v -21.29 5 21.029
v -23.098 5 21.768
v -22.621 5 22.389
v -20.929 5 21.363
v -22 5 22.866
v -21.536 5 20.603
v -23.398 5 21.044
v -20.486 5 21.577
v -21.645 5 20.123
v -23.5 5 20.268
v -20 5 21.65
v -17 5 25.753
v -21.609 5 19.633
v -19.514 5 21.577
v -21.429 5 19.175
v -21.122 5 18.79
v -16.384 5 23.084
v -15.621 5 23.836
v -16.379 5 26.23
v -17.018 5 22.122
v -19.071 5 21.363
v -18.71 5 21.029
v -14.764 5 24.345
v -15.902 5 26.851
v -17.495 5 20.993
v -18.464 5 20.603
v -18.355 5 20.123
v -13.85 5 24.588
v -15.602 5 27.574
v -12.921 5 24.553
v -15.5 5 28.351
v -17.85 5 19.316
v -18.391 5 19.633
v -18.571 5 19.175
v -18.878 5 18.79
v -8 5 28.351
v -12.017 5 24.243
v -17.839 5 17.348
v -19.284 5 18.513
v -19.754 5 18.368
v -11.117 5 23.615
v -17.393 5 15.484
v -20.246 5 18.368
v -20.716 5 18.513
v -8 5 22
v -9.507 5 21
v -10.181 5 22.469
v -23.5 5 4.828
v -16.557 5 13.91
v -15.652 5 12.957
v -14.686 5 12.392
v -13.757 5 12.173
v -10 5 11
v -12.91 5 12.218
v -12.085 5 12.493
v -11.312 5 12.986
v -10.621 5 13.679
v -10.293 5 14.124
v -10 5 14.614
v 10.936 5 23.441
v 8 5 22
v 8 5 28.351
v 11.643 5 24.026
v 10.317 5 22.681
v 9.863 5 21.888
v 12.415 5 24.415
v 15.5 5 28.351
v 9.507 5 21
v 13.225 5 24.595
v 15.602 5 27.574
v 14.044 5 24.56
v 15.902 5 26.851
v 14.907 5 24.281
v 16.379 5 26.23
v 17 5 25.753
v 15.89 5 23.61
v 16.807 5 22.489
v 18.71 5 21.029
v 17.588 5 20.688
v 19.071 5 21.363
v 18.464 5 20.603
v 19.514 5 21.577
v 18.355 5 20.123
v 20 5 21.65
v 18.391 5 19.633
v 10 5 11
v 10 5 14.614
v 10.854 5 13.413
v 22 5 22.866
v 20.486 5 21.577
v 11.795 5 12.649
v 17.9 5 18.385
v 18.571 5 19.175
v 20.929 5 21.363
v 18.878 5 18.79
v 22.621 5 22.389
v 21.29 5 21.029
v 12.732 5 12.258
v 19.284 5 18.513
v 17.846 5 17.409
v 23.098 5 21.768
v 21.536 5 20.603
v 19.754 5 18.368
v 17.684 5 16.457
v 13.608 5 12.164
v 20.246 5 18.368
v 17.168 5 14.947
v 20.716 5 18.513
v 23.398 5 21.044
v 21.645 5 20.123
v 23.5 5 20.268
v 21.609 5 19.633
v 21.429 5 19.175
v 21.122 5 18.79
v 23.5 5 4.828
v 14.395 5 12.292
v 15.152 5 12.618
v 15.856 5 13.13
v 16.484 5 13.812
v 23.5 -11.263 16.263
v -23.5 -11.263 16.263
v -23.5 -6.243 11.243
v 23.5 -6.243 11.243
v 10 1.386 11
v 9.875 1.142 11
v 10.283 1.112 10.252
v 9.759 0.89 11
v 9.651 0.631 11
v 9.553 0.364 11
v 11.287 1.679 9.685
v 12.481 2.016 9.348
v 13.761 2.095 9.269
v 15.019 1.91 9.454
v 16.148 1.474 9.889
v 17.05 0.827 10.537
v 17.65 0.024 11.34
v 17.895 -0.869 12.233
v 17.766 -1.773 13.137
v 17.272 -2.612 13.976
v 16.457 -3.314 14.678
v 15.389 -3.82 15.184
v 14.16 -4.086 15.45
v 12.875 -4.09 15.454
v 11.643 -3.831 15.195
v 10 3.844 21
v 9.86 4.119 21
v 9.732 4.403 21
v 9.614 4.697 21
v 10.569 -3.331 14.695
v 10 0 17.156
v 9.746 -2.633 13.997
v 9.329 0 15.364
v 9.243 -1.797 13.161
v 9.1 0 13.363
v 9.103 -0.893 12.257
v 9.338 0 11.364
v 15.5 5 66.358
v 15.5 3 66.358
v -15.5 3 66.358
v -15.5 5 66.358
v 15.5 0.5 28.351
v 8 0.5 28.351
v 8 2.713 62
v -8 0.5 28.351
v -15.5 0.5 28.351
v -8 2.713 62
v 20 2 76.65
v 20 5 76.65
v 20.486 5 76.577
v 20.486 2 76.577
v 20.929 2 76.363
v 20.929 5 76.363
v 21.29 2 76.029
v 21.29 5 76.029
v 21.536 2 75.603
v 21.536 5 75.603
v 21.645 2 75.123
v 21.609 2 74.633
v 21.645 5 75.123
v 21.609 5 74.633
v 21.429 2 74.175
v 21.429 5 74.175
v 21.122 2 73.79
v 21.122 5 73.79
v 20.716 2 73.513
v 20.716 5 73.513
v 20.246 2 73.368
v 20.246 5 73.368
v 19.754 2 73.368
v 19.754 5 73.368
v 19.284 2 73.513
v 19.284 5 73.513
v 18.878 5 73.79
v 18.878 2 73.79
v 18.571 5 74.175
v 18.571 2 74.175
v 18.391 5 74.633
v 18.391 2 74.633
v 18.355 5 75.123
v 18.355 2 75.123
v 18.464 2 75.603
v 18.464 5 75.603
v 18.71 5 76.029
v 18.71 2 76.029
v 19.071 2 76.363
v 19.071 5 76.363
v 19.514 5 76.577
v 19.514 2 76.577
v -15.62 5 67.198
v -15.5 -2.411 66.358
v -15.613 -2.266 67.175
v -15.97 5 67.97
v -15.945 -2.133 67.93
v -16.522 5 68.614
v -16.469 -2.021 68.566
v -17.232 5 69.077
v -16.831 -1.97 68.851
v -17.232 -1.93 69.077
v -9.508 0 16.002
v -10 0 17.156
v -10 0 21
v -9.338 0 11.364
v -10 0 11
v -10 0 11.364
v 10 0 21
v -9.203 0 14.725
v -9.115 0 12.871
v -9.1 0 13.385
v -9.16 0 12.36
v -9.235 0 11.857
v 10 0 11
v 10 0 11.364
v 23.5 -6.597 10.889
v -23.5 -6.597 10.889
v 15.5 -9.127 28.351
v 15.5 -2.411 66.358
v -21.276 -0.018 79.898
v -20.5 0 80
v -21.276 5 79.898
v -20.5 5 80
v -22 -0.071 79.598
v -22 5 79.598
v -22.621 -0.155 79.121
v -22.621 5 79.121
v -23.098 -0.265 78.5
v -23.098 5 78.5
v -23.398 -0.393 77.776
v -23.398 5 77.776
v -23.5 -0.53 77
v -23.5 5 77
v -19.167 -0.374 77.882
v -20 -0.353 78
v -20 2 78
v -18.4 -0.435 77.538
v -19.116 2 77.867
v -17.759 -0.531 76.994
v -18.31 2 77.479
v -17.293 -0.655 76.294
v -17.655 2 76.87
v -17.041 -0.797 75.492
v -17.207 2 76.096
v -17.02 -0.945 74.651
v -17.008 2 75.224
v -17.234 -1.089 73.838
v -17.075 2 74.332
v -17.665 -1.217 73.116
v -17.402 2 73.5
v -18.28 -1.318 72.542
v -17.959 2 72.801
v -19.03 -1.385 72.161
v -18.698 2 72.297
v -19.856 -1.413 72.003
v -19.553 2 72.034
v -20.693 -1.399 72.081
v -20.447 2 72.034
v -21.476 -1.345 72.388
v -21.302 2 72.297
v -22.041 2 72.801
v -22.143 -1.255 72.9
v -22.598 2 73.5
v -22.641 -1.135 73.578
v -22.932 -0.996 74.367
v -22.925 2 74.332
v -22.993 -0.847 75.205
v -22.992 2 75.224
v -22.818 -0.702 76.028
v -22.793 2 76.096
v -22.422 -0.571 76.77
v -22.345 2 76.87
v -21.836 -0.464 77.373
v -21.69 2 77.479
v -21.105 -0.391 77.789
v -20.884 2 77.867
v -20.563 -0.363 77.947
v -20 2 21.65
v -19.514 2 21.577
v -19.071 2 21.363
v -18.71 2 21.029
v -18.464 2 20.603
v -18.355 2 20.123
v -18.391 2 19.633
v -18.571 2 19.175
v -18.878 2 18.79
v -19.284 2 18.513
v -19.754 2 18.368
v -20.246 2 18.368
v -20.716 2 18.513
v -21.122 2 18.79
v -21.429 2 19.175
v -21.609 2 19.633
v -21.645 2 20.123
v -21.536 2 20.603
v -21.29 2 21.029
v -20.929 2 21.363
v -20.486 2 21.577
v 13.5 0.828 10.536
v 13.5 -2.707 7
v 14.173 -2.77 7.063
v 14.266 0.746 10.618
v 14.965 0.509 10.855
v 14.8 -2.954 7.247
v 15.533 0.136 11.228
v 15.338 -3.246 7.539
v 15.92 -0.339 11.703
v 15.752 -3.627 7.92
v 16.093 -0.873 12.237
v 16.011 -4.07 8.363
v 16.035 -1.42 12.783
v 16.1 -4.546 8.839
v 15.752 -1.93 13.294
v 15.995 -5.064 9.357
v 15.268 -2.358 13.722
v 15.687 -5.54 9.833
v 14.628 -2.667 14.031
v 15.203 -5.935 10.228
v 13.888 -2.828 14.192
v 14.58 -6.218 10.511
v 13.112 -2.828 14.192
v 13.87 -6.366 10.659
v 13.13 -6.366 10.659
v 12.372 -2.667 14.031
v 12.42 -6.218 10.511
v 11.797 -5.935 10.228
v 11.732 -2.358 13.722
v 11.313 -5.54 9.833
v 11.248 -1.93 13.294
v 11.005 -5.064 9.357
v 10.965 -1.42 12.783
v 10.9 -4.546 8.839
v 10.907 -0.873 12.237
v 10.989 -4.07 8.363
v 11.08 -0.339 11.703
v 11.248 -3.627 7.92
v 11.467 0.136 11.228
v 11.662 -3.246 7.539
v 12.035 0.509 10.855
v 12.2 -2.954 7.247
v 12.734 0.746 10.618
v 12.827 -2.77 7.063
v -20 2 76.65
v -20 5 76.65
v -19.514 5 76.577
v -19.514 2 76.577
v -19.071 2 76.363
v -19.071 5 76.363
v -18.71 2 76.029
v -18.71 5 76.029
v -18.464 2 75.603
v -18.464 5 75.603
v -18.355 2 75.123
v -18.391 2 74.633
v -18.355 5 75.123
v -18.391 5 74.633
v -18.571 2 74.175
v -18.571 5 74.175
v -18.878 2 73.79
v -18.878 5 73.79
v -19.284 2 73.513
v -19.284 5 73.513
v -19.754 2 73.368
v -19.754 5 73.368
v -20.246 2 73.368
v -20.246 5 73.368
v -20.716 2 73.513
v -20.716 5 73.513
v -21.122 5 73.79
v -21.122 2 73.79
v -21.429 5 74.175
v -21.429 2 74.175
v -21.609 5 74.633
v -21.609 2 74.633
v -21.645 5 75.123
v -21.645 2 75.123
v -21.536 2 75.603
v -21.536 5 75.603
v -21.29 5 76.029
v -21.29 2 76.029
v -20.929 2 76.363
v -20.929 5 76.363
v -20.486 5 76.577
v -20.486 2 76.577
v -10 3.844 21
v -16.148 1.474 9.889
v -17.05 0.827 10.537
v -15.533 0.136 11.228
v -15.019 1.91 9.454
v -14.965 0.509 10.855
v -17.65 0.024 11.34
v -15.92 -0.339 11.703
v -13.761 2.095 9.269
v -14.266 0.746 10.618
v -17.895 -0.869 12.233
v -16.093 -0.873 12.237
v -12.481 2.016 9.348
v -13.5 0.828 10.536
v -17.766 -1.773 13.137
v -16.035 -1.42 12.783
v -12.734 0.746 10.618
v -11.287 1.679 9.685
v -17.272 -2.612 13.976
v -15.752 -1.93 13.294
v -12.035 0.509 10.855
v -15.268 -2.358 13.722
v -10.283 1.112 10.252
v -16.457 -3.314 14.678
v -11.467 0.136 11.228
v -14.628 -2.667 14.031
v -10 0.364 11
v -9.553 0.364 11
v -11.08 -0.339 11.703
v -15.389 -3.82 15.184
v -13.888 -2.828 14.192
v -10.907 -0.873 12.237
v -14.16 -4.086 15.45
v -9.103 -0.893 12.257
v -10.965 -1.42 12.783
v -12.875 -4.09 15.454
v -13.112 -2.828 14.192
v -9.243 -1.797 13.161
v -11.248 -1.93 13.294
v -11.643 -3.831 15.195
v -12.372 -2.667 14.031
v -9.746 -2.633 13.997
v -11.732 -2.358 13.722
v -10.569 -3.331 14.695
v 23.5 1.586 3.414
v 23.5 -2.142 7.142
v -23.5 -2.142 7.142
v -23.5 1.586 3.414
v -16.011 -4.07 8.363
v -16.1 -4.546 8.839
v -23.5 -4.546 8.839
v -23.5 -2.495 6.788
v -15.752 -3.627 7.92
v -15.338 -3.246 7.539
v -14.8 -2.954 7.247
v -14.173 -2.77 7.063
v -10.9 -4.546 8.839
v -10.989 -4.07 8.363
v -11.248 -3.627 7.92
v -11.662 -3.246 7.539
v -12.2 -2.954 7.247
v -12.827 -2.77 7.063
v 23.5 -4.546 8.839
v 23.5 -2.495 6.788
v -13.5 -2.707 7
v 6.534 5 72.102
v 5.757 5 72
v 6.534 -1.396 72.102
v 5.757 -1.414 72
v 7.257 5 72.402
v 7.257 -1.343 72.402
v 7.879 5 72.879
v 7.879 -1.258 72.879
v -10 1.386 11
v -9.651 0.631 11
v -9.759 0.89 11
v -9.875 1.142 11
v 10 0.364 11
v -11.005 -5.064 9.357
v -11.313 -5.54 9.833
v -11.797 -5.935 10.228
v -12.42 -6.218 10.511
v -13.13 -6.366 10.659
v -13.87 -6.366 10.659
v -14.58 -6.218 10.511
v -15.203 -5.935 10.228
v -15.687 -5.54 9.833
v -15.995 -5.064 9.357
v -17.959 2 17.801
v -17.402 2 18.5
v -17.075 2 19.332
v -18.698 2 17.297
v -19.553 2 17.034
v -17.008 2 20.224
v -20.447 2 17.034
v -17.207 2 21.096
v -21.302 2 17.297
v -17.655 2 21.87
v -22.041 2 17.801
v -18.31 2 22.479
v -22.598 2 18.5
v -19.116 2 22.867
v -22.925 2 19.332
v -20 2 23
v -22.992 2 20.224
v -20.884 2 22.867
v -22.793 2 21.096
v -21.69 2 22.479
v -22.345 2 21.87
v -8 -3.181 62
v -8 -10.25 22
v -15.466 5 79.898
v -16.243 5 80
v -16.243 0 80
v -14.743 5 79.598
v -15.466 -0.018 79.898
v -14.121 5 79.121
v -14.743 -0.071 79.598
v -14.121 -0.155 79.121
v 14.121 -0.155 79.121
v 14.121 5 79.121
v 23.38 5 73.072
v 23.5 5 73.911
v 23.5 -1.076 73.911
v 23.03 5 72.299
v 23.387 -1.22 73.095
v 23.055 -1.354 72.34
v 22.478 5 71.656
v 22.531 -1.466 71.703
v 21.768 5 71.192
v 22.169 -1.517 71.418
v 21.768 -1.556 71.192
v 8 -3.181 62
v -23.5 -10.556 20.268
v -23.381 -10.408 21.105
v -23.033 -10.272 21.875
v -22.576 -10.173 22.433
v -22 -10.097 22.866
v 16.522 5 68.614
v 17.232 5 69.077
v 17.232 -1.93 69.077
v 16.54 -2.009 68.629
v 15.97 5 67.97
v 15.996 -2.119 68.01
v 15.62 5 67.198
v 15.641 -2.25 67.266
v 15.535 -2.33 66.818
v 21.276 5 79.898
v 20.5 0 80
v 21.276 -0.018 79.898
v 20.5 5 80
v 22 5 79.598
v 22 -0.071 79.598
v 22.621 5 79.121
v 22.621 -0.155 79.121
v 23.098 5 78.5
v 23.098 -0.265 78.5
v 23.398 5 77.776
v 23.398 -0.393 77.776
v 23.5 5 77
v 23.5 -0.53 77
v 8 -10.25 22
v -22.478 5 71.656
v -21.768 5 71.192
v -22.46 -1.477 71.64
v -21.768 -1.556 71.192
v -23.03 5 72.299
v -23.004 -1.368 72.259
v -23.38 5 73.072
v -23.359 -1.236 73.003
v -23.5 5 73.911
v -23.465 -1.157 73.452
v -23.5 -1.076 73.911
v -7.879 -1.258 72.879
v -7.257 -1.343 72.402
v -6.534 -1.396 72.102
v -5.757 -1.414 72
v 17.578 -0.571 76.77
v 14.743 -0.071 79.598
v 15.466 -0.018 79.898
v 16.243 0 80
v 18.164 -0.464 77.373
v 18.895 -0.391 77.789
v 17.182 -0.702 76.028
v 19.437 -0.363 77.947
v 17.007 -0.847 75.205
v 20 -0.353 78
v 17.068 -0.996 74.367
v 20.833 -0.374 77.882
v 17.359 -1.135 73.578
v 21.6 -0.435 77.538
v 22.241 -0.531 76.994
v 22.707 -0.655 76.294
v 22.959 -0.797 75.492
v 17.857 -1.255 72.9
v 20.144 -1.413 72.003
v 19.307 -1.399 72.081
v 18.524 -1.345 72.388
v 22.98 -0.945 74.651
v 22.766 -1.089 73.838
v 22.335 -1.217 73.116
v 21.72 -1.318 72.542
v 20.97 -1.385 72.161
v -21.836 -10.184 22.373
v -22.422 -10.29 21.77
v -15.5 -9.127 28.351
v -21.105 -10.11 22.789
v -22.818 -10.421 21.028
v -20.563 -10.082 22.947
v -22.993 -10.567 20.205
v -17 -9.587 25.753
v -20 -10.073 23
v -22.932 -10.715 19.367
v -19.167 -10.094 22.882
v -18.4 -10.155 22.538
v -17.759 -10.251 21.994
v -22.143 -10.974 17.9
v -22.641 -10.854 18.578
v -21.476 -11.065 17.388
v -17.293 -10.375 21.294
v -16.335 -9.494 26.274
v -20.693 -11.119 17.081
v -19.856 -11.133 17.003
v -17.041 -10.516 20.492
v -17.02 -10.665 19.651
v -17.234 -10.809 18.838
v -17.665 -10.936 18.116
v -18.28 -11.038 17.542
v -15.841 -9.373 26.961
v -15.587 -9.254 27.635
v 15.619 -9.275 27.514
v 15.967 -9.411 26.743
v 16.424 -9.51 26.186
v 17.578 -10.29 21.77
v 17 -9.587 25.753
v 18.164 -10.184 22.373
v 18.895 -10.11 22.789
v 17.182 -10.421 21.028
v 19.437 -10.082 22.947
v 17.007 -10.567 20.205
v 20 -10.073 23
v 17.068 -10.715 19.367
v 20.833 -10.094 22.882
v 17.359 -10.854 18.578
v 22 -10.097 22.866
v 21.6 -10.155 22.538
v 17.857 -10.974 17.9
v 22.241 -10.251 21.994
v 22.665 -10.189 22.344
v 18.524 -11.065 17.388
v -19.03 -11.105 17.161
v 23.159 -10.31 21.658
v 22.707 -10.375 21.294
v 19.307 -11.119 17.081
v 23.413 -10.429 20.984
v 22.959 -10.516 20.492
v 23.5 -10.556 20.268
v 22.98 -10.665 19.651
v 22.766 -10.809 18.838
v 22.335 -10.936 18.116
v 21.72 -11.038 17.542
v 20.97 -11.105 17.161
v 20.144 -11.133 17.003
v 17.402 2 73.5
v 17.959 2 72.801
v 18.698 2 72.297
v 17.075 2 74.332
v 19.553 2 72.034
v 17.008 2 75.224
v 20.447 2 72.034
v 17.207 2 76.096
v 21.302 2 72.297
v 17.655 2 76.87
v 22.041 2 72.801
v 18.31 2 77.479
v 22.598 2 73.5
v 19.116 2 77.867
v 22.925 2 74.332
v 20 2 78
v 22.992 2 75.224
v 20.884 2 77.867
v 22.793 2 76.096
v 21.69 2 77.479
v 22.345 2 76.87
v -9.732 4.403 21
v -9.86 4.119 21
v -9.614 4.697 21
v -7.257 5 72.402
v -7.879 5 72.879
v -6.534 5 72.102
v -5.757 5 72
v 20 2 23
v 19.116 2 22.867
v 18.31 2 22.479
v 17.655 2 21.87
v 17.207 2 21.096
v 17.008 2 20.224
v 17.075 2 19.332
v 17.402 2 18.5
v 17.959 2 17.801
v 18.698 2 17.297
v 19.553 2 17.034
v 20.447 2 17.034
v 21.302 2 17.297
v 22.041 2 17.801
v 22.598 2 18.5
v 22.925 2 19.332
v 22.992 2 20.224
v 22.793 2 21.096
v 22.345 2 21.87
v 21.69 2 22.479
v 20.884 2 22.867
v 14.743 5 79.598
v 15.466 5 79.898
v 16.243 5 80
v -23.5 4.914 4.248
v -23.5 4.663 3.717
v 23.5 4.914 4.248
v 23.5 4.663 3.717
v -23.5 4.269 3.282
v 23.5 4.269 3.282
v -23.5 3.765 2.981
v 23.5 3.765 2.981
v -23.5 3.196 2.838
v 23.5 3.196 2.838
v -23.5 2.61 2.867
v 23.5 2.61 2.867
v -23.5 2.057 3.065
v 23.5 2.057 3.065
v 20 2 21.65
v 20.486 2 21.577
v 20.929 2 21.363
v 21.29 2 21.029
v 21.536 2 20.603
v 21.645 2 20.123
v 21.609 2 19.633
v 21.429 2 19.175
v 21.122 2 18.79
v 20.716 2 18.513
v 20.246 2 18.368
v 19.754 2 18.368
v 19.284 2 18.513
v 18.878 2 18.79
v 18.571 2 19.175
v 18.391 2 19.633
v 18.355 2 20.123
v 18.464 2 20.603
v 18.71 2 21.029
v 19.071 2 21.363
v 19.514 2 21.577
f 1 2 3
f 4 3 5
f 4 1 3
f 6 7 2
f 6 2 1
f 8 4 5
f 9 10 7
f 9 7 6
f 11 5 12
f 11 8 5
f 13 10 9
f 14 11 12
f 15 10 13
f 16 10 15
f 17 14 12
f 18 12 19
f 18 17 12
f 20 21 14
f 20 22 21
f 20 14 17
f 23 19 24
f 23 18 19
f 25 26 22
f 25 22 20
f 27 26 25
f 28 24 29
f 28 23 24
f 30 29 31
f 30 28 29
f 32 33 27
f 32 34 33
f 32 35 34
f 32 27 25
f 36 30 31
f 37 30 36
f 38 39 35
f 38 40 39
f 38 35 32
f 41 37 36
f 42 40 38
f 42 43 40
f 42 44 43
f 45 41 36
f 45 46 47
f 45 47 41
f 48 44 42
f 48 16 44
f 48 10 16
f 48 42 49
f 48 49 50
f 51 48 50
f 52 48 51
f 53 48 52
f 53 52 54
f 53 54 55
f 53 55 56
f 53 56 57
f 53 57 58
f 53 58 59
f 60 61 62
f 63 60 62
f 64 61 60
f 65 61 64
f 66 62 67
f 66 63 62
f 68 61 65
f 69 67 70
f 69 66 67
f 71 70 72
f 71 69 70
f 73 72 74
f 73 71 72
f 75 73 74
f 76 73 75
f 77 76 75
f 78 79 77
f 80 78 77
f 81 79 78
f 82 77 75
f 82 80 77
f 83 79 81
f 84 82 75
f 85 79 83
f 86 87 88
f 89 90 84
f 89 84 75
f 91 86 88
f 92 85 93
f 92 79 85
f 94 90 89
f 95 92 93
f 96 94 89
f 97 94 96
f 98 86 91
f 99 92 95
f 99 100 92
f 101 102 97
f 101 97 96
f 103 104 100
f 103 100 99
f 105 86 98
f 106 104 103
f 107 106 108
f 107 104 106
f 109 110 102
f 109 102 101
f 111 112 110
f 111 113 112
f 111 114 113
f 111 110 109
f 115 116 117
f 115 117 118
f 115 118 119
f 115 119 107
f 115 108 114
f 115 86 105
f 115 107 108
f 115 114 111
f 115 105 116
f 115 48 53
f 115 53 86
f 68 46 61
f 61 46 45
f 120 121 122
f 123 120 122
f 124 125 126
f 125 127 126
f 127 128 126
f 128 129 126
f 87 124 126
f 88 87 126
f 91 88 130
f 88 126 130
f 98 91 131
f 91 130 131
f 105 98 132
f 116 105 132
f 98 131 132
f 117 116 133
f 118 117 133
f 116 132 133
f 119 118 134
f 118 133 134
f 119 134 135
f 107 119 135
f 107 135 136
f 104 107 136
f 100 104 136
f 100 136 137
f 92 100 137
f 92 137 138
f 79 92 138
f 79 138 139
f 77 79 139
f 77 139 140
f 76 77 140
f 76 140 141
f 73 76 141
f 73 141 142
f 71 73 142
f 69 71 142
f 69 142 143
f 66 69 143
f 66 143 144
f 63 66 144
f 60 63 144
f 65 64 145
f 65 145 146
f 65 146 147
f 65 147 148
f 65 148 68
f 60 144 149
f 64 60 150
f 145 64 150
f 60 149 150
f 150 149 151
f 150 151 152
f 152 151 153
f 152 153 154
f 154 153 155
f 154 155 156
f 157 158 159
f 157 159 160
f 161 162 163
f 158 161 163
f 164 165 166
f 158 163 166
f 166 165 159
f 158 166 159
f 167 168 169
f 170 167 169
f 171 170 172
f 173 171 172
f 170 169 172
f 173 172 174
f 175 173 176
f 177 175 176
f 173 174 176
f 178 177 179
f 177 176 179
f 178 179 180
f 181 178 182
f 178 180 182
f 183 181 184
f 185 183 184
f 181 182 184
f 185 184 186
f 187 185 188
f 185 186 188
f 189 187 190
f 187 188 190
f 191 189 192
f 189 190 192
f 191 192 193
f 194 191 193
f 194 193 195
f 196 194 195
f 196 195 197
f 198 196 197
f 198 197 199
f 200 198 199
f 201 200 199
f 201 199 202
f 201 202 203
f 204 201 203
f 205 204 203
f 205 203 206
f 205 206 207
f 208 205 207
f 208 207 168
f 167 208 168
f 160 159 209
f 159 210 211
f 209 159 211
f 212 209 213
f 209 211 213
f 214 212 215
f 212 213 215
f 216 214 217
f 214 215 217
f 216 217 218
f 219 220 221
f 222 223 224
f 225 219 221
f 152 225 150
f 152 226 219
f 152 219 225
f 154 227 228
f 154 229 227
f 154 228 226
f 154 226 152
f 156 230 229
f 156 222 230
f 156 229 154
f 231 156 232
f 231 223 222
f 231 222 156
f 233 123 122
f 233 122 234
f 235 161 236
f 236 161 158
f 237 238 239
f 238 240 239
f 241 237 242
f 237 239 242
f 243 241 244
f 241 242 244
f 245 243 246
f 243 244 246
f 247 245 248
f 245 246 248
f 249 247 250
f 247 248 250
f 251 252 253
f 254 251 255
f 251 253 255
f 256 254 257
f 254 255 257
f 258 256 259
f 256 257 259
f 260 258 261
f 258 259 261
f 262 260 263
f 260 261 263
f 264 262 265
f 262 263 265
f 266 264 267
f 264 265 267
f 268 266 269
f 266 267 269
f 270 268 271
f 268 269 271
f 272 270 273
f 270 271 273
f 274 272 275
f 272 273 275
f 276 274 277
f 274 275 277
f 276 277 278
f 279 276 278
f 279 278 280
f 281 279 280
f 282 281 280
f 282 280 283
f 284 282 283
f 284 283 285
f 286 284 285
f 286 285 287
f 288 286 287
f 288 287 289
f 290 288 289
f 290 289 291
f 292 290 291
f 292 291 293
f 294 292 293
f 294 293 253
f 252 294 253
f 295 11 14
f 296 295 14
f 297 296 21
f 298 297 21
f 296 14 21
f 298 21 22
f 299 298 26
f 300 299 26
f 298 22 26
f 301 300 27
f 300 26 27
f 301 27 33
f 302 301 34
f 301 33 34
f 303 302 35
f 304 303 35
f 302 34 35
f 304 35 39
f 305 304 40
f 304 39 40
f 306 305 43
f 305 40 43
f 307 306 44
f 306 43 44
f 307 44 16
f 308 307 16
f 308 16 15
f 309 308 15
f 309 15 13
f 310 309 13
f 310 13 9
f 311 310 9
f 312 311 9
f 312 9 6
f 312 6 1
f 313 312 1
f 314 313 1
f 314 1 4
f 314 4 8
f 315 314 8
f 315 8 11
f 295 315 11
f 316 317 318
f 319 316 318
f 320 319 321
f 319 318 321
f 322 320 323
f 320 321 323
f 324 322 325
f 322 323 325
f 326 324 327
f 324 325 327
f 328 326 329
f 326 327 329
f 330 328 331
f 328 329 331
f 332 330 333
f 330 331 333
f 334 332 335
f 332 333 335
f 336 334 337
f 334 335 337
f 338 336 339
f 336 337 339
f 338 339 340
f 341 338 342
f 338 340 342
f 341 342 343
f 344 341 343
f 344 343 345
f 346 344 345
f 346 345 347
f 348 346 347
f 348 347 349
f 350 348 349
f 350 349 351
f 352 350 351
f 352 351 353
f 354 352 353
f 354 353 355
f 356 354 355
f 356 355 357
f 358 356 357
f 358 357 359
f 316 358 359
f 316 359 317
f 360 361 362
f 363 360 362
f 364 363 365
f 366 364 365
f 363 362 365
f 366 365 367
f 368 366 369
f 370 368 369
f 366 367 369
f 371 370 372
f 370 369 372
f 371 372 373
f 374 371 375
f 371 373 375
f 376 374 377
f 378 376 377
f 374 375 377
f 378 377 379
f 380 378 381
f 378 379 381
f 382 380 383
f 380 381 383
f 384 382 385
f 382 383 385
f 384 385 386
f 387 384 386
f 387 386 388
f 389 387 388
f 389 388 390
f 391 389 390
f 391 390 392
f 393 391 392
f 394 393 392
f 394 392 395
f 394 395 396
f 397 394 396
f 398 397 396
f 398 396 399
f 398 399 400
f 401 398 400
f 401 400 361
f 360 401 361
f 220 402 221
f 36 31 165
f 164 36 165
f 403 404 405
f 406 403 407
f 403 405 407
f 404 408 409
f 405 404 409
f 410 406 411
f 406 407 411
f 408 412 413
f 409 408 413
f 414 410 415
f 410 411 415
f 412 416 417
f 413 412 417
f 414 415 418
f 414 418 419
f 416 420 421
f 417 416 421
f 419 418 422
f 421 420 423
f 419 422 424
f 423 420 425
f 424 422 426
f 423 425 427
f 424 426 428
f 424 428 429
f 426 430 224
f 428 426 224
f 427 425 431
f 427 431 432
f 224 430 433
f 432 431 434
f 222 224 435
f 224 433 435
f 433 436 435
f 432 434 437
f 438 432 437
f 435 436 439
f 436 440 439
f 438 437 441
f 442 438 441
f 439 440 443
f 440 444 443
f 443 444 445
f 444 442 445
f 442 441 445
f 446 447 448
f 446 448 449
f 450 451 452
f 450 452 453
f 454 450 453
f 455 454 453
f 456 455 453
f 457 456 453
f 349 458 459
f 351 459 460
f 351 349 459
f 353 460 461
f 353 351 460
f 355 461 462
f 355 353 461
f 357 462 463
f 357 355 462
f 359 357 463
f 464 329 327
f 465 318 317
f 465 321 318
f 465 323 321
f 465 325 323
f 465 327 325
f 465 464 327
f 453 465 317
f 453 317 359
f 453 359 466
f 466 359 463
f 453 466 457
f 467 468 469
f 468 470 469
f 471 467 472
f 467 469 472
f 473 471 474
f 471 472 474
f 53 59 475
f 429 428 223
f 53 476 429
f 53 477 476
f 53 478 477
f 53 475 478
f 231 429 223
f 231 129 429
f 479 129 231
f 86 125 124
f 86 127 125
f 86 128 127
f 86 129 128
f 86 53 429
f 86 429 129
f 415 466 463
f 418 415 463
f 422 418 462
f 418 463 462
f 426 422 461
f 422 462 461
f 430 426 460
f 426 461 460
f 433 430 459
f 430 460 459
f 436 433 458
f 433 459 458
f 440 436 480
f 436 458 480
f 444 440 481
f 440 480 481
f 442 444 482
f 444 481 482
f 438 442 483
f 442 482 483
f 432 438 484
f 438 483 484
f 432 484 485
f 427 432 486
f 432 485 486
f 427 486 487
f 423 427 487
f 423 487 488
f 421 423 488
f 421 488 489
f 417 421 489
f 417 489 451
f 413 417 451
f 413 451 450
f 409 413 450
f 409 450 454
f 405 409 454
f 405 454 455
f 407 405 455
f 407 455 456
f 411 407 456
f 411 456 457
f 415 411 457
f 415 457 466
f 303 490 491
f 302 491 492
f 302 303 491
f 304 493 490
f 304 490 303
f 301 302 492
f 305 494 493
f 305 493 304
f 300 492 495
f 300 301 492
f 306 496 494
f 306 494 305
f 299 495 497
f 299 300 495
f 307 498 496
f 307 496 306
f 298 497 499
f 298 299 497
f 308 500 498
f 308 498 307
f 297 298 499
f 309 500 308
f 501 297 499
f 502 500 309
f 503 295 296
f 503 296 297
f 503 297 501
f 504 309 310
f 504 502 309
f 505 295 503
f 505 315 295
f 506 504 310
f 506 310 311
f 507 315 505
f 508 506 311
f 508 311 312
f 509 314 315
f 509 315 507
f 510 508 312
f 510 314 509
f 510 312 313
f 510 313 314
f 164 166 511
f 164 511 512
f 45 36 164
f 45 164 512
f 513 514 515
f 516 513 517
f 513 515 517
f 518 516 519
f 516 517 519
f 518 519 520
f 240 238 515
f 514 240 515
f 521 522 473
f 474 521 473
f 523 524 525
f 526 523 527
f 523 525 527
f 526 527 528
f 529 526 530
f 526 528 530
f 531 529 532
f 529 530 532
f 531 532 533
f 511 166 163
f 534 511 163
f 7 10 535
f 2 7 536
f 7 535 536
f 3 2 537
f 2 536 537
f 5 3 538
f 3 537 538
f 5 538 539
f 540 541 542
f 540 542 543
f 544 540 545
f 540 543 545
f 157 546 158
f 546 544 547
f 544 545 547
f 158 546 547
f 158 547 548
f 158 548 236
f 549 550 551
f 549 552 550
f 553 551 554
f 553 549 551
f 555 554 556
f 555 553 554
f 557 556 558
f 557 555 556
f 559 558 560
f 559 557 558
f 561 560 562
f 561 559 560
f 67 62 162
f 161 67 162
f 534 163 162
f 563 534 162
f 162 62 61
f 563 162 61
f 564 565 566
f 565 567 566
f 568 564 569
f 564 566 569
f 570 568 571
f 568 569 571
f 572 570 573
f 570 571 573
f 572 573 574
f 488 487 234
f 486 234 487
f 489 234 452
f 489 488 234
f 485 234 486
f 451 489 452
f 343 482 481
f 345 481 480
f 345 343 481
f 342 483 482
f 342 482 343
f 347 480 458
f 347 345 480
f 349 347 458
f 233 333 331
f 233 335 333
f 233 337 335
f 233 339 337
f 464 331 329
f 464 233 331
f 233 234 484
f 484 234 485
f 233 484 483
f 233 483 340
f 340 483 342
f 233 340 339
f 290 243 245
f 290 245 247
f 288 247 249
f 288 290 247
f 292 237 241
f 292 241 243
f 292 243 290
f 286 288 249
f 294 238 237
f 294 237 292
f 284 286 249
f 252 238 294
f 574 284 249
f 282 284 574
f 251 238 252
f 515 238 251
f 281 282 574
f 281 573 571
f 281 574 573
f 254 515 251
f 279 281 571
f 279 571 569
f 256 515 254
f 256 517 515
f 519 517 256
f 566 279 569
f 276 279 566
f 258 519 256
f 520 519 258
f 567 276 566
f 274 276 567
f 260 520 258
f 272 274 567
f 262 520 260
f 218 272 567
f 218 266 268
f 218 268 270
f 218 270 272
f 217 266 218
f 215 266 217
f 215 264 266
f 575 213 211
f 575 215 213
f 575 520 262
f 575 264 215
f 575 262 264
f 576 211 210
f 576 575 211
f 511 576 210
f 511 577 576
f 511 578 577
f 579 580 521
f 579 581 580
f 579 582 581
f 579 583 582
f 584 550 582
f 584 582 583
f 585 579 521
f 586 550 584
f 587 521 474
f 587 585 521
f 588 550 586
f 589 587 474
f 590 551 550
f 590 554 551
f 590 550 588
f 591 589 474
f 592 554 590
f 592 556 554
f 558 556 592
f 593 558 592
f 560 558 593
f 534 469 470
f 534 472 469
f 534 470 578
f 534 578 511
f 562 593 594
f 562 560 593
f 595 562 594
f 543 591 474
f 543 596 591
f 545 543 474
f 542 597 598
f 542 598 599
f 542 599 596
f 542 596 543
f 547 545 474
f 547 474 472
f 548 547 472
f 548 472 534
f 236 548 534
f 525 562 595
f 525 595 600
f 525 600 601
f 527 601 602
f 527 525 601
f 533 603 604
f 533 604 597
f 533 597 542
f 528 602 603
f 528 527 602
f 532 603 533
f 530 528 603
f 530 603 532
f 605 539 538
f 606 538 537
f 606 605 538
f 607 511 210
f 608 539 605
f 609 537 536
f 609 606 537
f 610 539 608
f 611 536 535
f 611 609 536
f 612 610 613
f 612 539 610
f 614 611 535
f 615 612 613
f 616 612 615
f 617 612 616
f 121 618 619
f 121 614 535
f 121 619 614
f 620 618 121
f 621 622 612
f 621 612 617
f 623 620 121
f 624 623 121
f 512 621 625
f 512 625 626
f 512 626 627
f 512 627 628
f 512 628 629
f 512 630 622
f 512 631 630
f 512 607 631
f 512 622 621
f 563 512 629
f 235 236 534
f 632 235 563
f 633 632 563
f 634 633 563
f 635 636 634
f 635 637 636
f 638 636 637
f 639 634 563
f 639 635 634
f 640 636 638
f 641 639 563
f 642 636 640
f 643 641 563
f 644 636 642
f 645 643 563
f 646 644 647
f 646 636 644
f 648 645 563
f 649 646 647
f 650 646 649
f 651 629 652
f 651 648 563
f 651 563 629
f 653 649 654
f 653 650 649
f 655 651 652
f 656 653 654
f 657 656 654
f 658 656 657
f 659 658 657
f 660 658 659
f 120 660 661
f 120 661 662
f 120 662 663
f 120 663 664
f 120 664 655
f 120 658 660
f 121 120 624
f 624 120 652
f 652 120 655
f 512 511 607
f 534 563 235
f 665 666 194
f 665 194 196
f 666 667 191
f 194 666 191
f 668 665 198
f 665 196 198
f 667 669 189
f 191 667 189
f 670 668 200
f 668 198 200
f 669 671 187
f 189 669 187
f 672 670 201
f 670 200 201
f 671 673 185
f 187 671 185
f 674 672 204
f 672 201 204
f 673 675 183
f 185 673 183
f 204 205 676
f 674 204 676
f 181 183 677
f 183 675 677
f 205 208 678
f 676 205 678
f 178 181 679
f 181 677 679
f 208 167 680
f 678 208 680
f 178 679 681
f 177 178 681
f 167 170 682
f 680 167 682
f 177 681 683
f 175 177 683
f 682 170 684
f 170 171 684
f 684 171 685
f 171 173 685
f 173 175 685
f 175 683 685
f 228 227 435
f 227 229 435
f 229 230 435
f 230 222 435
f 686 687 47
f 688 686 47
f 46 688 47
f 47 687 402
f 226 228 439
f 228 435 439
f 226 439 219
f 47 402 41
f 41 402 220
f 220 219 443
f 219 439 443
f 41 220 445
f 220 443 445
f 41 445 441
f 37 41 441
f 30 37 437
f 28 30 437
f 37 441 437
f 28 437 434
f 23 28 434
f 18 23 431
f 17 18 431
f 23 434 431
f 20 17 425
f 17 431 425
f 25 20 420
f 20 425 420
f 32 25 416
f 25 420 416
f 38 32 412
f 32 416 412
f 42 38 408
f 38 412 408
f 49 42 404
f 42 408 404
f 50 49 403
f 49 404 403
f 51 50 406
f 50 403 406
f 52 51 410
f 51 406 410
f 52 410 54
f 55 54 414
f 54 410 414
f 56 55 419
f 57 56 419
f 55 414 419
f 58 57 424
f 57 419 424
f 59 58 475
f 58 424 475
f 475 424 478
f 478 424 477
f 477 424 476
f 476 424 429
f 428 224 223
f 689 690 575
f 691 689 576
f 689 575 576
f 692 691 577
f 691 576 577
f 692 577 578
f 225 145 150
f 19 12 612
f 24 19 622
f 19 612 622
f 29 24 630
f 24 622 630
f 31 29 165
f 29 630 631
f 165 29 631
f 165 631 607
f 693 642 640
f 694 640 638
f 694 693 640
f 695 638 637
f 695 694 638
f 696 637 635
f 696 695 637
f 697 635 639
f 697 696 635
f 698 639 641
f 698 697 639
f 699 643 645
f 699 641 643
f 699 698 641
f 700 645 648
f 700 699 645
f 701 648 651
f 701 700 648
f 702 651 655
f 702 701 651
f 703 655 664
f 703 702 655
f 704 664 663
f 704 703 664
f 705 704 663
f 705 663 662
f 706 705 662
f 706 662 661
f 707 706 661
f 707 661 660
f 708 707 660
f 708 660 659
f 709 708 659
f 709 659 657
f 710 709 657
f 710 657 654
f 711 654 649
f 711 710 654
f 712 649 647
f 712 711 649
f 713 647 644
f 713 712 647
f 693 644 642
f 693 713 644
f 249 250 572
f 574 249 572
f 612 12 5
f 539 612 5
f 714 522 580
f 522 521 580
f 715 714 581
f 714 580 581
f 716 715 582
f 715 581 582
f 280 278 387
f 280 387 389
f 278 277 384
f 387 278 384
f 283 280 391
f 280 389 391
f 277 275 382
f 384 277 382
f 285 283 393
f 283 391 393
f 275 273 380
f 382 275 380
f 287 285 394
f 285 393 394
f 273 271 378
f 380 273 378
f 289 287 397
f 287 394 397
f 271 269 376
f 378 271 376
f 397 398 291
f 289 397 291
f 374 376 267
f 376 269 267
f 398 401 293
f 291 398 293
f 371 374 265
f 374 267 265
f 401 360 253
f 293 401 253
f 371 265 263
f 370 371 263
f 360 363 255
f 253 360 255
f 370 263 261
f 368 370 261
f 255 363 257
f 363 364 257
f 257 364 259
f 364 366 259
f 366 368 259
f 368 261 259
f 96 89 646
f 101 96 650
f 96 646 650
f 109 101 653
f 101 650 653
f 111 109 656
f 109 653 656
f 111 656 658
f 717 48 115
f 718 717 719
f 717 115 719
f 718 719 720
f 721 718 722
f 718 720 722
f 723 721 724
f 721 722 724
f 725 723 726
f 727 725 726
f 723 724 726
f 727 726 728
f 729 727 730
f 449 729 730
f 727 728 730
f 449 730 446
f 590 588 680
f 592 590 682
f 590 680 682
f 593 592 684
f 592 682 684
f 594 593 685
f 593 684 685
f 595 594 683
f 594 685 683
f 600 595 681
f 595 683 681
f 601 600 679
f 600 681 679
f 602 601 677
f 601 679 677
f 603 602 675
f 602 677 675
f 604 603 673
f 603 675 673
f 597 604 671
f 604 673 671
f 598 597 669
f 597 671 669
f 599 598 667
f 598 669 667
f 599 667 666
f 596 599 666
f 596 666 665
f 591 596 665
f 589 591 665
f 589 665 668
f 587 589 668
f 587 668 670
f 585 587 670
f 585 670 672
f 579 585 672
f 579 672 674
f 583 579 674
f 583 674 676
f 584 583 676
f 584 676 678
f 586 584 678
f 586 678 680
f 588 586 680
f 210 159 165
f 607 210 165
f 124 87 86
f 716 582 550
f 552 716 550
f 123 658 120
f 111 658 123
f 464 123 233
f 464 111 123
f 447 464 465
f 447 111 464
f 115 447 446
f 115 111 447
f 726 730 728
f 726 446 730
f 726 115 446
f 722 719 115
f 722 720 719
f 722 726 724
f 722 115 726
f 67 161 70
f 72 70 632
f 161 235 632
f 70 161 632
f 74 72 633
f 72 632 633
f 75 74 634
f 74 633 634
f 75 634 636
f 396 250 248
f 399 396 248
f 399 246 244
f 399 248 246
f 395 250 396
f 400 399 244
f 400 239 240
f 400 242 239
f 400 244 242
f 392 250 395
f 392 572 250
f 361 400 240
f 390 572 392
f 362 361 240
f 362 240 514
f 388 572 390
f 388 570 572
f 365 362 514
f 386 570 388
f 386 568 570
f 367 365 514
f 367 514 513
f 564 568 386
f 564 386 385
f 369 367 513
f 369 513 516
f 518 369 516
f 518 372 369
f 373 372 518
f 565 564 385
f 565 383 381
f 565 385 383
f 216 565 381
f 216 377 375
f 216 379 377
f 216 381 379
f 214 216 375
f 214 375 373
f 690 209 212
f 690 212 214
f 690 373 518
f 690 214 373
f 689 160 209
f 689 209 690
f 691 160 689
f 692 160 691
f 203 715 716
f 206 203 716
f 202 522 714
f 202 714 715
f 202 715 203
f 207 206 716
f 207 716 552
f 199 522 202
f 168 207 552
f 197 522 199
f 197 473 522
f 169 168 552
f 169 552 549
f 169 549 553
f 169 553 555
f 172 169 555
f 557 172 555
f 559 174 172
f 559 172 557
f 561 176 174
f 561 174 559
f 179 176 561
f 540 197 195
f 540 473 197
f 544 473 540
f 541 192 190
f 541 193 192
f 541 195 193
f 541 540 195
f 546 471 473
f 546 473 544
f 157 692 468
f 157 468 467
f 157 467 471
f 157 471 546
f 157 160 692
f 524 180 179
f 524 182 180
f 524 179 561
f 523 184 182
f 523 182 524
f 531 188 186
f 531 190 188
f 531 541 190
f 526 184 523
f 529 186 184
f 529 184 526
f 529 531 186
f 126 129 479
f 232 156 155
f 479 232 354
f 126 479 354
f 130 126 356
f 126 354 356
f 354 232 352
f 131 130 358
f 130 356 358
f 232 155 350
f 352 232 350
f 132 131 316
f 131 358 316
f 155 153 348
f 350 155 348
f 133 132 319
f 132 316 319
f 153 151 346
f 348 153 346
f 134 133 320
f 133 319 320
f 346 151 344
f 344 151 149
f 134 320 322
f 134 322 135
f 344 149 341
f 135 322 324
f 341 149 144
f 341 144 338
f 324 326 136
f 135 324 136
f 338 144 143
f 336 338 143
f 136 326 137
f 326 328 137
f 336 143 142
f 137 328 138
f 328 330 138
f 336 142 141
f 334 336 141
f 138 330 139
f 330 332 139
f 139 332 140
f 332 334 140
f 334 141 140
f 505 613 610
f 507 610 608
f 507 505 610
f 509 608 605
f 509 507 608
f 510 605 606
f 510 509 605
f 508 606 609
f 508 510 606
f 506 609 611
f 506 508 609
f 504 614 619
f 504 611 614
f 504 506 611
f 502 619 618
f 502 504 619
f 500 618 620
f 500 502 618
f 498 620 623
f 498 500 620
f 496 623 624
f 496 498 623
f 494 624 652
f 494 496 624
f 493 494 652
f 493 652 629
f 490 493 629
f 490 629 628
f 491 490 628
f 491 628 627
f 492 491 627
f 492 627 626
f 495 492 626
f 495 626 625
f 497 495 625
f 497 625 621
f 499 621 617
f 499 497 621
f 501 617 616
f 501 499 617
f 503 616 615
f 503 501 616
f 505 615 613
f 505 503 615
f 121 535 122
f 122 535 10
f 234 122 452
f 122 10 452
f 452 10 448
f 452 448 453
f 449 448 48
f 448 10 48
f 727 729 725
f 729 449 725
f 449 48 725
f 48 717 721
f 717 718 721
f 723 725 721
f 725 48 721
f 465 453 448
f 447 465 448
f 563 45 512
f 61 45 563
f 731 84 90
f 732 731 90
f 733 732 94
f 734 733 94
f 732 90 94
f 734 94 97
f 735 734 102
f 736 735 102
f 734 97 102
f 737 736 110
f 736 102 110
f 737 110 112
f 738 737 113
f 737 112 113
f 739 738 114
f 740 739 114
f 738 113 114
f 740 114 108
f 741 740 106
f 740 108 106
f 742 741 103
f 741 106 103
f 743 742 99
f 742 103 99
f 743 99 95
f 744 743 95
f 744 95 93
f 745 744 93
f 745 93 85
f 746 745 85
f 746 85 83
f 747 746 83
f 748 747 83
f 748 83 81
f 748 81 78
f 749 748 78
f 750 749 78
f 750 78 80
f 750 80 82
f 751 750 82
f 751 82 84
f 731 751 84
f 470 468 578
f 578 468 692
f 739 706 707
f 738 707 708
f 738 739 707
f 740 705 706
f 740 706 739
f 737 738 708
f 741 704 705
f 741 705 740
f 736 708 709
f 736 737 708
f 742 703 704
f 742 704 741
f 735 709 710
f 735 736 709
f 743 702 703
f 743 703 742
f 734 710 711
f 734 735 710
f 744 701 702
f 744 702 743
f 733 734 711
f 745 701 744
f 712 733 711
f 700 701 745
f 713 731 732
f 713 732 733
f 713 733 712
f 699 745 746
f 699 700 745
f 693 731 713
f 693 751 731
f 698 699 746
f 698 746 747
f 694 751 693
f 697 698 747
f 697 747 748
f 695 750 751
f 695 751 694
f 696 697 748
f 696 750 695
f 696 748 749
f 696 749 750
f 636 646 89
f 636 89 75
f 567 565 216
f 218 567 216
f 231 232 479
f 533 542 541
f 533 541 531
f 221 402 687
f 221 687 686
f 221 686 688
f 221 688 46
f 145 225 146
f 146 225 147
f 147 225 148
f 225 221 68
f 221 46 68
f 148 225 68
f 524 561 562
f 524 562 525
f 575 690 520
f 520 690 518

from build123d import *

# Parameters (mm, degrees)
EXTRUDE_2_DEPTH      = 5
EXTRUDE_3_DEPTH      = 23.5
SKETCH_3_R           = 1.65
CUT_EXTRUDE_1_DEPTH  = 85.951456727
CUT_EXTRUDE_5_REACH  = 89.951
CUT_EXTRUDE_START    = 3
SKETCH_8_R           = 3
CUT_EXTRUDE_10_REACH = 89.951
CUT_EXTRUDE_START_2  = -3
SKETCH_12_R          = 3
SKETCH_4_W           = 20
SKETCH_4_H           = 10
CUT_EXTRUDE_2_DEPTH  = 5
SKETCH_10_W          = 16
SKETCH_10_H          = 40
CUT_EXTRUDE_11_DEPTH = 85.951456727
FILLET_1_R           = 3
CUT_EXTRUDE_6_DEPTH  = 94.465851734
SKETCH_6_R           = 2.6
CUT_EXTRUDE_3_DEPTH  = 83.421182124
CUT_EXTRUDE_4_REACH  = 89.421
CUT_EXTRUDE_START_3  = -5
SKETCH_7_R           = 4.4
FILLET_3_R           = 2
CUT_EXTRUDE_13_DEPTH = 90.709896


with BuildPart() as part:
    # 草图2 → 凸台-拉伸2 (new body)
    with BuildSketch(Plane(origin=(0, 0, 0), x_dir=(1, 0, 0), z_dir=(0, 1, 0))):
        Polygon((0, 0), (23.5, 0), (23.5, -19), (23.5, -80), (0, -80), align=None)
    extrude_2 = extrude(amount=EXTRUDE_2_DEPTH)

    # 镜向1: 凸台-拉伸2 across plane
    add(extrude_2.mirror(Plane(origin=(0, 5, 80), x_dir=(0, 0, 1), z_dir=(1, 0, 0))))

    # 草图5 → 凸台-拉伸3 (add, symmetric)
    with BuildSketch(Plane(origin=(0, 0, 0), x_dir=(0, 0, -1), z_dir=(1, 0, 0))):
        Polygon((-80, 0), (-16.263455967, -11.263455967), (-11.242997821, -6.242997821), (-9.192388155, -4.192388155), (-13.384776311, 0), align=None)
        Polygon((-13.384776311, 0), (-9.192388155, -4.192388155), (-7.14177849, -2.14177849), (-5, 0), align=None)
        Polygon((-7.14177849, -2.14177849), (-9.192388155, -4.192388155), (-8.838834765, -4.545941546), (-6.788225099, -2.495331881), align=None)
        Polygon((-9.192388155, -4.192388155), (-11.242997821, -6.242997821), (-10.88944443, -6.596551211), (-8.838834765, -4.545941546), align=None)
    extrude(amount=EXTRUDE_3_DEPTH, both=True)

    # 草图3 → 切除-拉伸1 (cut, through all)
    with BuildSketch(Plane(origin=(0, 5, 0), x_dir=(1, 0, 0), z_dir=(0, 1, 0))):
        with Locations(Location((-20, -20, 0), (0, 0, 270))):
            Circle(SKETCH_3_R)
        with Locations(Location((20, -20, 0), (0, 0, 270))):
            Circle(SKETCH_3_R)
        with Locations(Location((-20, -75, 0), (0, 0, 270))):
            Circle(SKETCH_3_R)
        with Locations(Location((20, -75, 0), (0, 0, 270))):
            Circle(SKETCH_3_R)
    extrude(amount=-CUT_EXTRUDE_1_DEPTH, mode=Mode.SUBTRACT)

    # 切除-拉伸5: up to this plane
    cut_extrude_5_end = Plane(origin=(23.5, -13.709378738, 2.422707194), z_dir=(0, 0.9847416717466503, -0.174022527063632))
    # 草图8 → 切除-拉伸5 (cut, up to the surface)
    with BuildSketch(Plane.XZ.offset(-5).offset(CUT_EXTRUDE_START), mode=Mode.PRIVATE) as cut_extrude_5_sk1:
        with Locations(Location((-20, 20, 0), (0, 0, 90))):
            Circle(SKETCH_8_R)
    cut_extrude_5_tool1 = split(extrude(cut_extrude_5_sk1.sketch, amount=CUT_EXTRUDE_5_REACH, mode=Mode.PRIVATE), bisect_by=cut_extrude_5_end, keep=Keep.BOTH, mode=Mode.PRIVATE)
    add(cut_extrude_5_tool1.solids().sort_by_distance((-20, 2, 20))[0], mode=Mode.SUBTRACT)
    # 草图8 → 切除-拉伸5 (cut, up to the surface)
    with BuildSketch(Plane.XZ.offset(-5).offset(CUT_EXTRUDE_START), mode=Mode.PRIVATE) as cut_extrude_5_sk2:
        with Locations(Location((20, 20, 0), (0, 0, 90))):
            Circle(SKETCH_8_R)
    cut_extrude_5_tool2 = split(extrude(cut_extrude_5_sk2.sketch, amount=CUT_EXTRUDE_5_REACH, mode=Mode.PRIVATE), bisect_by=cut_extrude_5_end, keep=Keep.BOTH, mode=Mode.PRIVATE)
    add(cut_extrude_5_tool2.solids().sort_by_distance((20, 2, 20))[0], mode=Mode.SUBTRACT)

    # 切除-拉伸10: up to this plane
    cut_extrude_10_end = Plane(origin=(23.5, -13.709378738, 2.422707194), z_dir=(0, 0.9847416717466503, -0.174022527063632))
    # 草图12 → 切除-拉伸10 (cut, up to the surface)
    with BuildSketch(Plane(origin=(0, 5, 0), x_dir=(1, 0, 0), z_dir=(0, 1, 0)).offset(CUT_EXTRUDE_START_2), mode=Mode.PRIVATE) as cut_extrude_10_sk1:
        with Locations(Location((-20, -75, 0), (0, 0, 270))):
            Circle(SKETCH_12_R)
    cut_extrude_10_tool1 = split(extrude(cut_extrude_10_sk1.sketch, amount=-CUT_EXTRUDE_10_REACH, mode=Mode.PRIVATE), bisect_by=cut_extrude_10_end, keep=Keep.BOTH, mode=Mode.PRIVATE)
    add(cut_extrude_10_tool1.solids().sort_by_distance((-20, 2, 75))[0], mode=Mode.SUBTRACT)
    # 草图12 → 切除-拉伸10 (cut, up to the surface)
    with BuildSketch(Plane(origin=(0, 5, 0), x_dir=(1, 0, 0), z_dir=(0, 1, 0)).offset(CUT_EXTRUDE_START_2), mode=Mode.PRIVATE) as cut_extrude_10_sk2:
        with Locations(Location((20, -75, 0), (0, 0, 270))):
            Circle(SKETCH_12_R)
    cut_extrude_10_tool2 = split(extrude(cut_extrude_10_sk2.sketch, amount=-CUT_EXTRUDE_10_REACH, mode=Mode.PRIVATE), bisect_by=cut_extrude_10_end, keep=Keep.BOTH, mode=Mode.PRIVATE)
    add(cut_extrude_10_tool2.solids().sort_by_distance((20, 2, 75))[0], mode=Mode.SUBTRACT)

    # 草图4 → 切除-拉伸2 (cut)
    with BuildSketch(Plane(origin=(0, 5, 0), x_dir=(1, 0, 0), z_dir=(0, 1, 0))):
        with Locations((0, -16)):
            Rectangle(SKETCH_4_W, SKETCH_4_H)
    extrude(amount=-CUT_EXTRUDE_2_DEPTH, mode=Mode.SUBTRACT)

    # 草图10 → 切除-拉伸11 (cut, through all)
    with BuildSketch(Plane(origin=(0, 5, 0), x_dir=(1, 0, 0), z_dir=(0, 1, 0))):
        with Locations((0, -42)):
            Rectangle(SKETCH_10_W, SKETCH_10_H)
        Polygon((-7, -72), (-15, -80), (15, -80), (7, -72), align=None)
        Polygon((23.5, -22), (15.5, -26.618802154), (15.5, -68.269538735), (23.5, -72), align=None)
        Polygon((-15.5, -26.618802154), (-23.5, -22), (-23.5, -72), (-15.5, -68.269538735), align=None)
    extrude(amount=-CUT_EXTRUDE_11_DEPTH, mode=Mode.SUBTRACT)

    # 圆角1
    fillet_1_edges = [part.edges().sort_by_distance(p)[0] for p in [
        (-23.5, -2.624849927, 22),
        (-23.5, 1.793124148, 72),
        (23.5, 1.793124148, 72),
        (23.5, -2.624849927, 22),
        (15, 2.5, 80),
        (-15, 2.5, 80),
        (-15.5, -2.216734964, 26.618802154),
        (-15.5, 1.463502525, 68.269538735),
        (15.5, 1.463502525, 68.269538735),
        (15.5, -2.216734964, 26.618802154),
        (-7, 1.793124148, 72),
        (7, 1.793124148, 72),
        (-23.5, 2.5, 80),
        (23.5, 2.5, 80),
    ]]
    fillet(fillet_1_edges, radius=FILLET_1_R)

    # 草图9 → 切除-拉伸6 (cut, through all)
    with BuildSketch(Plane(origin=(23.5, 0, 0), x_dir=(0, 0, -1), z_dir=(1, 0, 0))):
        Polygon((-5, 0), (0, 5), (0, 0), align=None)
    extrude(amount=-CUT_EXTRUDE_6_DEPTH, mode=Mode.SUBTRACT)

    # 草图6 → 切除-拉伸3 (cut, through all)
    with BuildSketch(Plane(origin=(0, 2.146446609, 2.146446609), x_dir=(1, 0, 0), z_dir=(0, -0.7071067811865459, -0.7071067811865491))):
        with Locations(Location((-13.5, 9.464466094, 0), (0, 0, 270))):
            Circle(SKETCH_6_R)
        with Locations(Location((13.5, 9.464466094, 0), (0, 0, 270))):
            Circle(SKETCH_6_R)
    extrude(amount=-CUT_EXTRUDE_3_DEPTH, mode=Mode.SUBTRACT)

    # 草图7 → 切除-拉伸4 (cut, up to next)
    with BuildSketch(Plane(origin=(0, 2.146446609, 2.146446609), x_dir=(1, 0, 0), z_dir=(0, -0.7071067811865459, -0.7071067811865491)).offset(CUT_EXTRUDE_START_3), mode=Mode.PRIVATE) as cut_extrude_4_sk1:
        with Locations((-13.5, 9.464466094)):
            Circle(SKETCH_7_R)
    cut_extrude_4_tool1 = extrude(cut_extrude_4_sk1.sketch, amount=-CUT_EXTRUDE_4_REACH, mode=Mode.PRIVATE) & part.part
    # 草图7 → 切除-拉伸4 (cut, up to next)
    with BuildSketch(Plane(origin=(0, 2.146446609, 2.146446609), x_dir=(1, 0, 0), z_dir=(0, -0.7071067811865459, -0.7071067811865491)).offset(CUT_EXTRUDE_START_3), mode=Mode.PRIVATE) as cut_extrude_4_sk2:
        with Locations((13.5, 9.464466094)):
            Circle(SKETCH_7_R)
    cut_extrude_4_tool2 = extrude(cut_extrude_4_sk2.sketch, amount=-CUT_EXTRUDE_4_REACH, mode=Mode.PRIVATE) & part.part
    add(cut_extrude_4_tool1.solids().sort_by_distance((-13.5, -1.010408, 12.374369))[0], mode=Mode.SUBTRACT)
    add(cut_extrude_4_tool2.solids().sort_by_distance((13.5, -1.010408, 12.374369))[0], mode=Mode.SUBTRACT)

    # 圆角3
    fillet_3_edges = [part.edges().sort_by_distance(p)[0] for p in [
        (0, 5, 0),
    ]]
    fillet(fillet_3_edges, radius=FILLET_3_R)

    # 草图14 → 切除-拉伸13 (cut, through all)
    with BuildSketch(Plane.ZY.offset(15.5)):
        Polygon((28.350852961, 5), (28.350852961, 0.5), (66.358327952, 3), (66.358327952, 5), align=None)
    extrude(amount=-CUT_EXTRUDE_13_DEPTH, mode=Mode.SUBTRACT)


solid = part.part
